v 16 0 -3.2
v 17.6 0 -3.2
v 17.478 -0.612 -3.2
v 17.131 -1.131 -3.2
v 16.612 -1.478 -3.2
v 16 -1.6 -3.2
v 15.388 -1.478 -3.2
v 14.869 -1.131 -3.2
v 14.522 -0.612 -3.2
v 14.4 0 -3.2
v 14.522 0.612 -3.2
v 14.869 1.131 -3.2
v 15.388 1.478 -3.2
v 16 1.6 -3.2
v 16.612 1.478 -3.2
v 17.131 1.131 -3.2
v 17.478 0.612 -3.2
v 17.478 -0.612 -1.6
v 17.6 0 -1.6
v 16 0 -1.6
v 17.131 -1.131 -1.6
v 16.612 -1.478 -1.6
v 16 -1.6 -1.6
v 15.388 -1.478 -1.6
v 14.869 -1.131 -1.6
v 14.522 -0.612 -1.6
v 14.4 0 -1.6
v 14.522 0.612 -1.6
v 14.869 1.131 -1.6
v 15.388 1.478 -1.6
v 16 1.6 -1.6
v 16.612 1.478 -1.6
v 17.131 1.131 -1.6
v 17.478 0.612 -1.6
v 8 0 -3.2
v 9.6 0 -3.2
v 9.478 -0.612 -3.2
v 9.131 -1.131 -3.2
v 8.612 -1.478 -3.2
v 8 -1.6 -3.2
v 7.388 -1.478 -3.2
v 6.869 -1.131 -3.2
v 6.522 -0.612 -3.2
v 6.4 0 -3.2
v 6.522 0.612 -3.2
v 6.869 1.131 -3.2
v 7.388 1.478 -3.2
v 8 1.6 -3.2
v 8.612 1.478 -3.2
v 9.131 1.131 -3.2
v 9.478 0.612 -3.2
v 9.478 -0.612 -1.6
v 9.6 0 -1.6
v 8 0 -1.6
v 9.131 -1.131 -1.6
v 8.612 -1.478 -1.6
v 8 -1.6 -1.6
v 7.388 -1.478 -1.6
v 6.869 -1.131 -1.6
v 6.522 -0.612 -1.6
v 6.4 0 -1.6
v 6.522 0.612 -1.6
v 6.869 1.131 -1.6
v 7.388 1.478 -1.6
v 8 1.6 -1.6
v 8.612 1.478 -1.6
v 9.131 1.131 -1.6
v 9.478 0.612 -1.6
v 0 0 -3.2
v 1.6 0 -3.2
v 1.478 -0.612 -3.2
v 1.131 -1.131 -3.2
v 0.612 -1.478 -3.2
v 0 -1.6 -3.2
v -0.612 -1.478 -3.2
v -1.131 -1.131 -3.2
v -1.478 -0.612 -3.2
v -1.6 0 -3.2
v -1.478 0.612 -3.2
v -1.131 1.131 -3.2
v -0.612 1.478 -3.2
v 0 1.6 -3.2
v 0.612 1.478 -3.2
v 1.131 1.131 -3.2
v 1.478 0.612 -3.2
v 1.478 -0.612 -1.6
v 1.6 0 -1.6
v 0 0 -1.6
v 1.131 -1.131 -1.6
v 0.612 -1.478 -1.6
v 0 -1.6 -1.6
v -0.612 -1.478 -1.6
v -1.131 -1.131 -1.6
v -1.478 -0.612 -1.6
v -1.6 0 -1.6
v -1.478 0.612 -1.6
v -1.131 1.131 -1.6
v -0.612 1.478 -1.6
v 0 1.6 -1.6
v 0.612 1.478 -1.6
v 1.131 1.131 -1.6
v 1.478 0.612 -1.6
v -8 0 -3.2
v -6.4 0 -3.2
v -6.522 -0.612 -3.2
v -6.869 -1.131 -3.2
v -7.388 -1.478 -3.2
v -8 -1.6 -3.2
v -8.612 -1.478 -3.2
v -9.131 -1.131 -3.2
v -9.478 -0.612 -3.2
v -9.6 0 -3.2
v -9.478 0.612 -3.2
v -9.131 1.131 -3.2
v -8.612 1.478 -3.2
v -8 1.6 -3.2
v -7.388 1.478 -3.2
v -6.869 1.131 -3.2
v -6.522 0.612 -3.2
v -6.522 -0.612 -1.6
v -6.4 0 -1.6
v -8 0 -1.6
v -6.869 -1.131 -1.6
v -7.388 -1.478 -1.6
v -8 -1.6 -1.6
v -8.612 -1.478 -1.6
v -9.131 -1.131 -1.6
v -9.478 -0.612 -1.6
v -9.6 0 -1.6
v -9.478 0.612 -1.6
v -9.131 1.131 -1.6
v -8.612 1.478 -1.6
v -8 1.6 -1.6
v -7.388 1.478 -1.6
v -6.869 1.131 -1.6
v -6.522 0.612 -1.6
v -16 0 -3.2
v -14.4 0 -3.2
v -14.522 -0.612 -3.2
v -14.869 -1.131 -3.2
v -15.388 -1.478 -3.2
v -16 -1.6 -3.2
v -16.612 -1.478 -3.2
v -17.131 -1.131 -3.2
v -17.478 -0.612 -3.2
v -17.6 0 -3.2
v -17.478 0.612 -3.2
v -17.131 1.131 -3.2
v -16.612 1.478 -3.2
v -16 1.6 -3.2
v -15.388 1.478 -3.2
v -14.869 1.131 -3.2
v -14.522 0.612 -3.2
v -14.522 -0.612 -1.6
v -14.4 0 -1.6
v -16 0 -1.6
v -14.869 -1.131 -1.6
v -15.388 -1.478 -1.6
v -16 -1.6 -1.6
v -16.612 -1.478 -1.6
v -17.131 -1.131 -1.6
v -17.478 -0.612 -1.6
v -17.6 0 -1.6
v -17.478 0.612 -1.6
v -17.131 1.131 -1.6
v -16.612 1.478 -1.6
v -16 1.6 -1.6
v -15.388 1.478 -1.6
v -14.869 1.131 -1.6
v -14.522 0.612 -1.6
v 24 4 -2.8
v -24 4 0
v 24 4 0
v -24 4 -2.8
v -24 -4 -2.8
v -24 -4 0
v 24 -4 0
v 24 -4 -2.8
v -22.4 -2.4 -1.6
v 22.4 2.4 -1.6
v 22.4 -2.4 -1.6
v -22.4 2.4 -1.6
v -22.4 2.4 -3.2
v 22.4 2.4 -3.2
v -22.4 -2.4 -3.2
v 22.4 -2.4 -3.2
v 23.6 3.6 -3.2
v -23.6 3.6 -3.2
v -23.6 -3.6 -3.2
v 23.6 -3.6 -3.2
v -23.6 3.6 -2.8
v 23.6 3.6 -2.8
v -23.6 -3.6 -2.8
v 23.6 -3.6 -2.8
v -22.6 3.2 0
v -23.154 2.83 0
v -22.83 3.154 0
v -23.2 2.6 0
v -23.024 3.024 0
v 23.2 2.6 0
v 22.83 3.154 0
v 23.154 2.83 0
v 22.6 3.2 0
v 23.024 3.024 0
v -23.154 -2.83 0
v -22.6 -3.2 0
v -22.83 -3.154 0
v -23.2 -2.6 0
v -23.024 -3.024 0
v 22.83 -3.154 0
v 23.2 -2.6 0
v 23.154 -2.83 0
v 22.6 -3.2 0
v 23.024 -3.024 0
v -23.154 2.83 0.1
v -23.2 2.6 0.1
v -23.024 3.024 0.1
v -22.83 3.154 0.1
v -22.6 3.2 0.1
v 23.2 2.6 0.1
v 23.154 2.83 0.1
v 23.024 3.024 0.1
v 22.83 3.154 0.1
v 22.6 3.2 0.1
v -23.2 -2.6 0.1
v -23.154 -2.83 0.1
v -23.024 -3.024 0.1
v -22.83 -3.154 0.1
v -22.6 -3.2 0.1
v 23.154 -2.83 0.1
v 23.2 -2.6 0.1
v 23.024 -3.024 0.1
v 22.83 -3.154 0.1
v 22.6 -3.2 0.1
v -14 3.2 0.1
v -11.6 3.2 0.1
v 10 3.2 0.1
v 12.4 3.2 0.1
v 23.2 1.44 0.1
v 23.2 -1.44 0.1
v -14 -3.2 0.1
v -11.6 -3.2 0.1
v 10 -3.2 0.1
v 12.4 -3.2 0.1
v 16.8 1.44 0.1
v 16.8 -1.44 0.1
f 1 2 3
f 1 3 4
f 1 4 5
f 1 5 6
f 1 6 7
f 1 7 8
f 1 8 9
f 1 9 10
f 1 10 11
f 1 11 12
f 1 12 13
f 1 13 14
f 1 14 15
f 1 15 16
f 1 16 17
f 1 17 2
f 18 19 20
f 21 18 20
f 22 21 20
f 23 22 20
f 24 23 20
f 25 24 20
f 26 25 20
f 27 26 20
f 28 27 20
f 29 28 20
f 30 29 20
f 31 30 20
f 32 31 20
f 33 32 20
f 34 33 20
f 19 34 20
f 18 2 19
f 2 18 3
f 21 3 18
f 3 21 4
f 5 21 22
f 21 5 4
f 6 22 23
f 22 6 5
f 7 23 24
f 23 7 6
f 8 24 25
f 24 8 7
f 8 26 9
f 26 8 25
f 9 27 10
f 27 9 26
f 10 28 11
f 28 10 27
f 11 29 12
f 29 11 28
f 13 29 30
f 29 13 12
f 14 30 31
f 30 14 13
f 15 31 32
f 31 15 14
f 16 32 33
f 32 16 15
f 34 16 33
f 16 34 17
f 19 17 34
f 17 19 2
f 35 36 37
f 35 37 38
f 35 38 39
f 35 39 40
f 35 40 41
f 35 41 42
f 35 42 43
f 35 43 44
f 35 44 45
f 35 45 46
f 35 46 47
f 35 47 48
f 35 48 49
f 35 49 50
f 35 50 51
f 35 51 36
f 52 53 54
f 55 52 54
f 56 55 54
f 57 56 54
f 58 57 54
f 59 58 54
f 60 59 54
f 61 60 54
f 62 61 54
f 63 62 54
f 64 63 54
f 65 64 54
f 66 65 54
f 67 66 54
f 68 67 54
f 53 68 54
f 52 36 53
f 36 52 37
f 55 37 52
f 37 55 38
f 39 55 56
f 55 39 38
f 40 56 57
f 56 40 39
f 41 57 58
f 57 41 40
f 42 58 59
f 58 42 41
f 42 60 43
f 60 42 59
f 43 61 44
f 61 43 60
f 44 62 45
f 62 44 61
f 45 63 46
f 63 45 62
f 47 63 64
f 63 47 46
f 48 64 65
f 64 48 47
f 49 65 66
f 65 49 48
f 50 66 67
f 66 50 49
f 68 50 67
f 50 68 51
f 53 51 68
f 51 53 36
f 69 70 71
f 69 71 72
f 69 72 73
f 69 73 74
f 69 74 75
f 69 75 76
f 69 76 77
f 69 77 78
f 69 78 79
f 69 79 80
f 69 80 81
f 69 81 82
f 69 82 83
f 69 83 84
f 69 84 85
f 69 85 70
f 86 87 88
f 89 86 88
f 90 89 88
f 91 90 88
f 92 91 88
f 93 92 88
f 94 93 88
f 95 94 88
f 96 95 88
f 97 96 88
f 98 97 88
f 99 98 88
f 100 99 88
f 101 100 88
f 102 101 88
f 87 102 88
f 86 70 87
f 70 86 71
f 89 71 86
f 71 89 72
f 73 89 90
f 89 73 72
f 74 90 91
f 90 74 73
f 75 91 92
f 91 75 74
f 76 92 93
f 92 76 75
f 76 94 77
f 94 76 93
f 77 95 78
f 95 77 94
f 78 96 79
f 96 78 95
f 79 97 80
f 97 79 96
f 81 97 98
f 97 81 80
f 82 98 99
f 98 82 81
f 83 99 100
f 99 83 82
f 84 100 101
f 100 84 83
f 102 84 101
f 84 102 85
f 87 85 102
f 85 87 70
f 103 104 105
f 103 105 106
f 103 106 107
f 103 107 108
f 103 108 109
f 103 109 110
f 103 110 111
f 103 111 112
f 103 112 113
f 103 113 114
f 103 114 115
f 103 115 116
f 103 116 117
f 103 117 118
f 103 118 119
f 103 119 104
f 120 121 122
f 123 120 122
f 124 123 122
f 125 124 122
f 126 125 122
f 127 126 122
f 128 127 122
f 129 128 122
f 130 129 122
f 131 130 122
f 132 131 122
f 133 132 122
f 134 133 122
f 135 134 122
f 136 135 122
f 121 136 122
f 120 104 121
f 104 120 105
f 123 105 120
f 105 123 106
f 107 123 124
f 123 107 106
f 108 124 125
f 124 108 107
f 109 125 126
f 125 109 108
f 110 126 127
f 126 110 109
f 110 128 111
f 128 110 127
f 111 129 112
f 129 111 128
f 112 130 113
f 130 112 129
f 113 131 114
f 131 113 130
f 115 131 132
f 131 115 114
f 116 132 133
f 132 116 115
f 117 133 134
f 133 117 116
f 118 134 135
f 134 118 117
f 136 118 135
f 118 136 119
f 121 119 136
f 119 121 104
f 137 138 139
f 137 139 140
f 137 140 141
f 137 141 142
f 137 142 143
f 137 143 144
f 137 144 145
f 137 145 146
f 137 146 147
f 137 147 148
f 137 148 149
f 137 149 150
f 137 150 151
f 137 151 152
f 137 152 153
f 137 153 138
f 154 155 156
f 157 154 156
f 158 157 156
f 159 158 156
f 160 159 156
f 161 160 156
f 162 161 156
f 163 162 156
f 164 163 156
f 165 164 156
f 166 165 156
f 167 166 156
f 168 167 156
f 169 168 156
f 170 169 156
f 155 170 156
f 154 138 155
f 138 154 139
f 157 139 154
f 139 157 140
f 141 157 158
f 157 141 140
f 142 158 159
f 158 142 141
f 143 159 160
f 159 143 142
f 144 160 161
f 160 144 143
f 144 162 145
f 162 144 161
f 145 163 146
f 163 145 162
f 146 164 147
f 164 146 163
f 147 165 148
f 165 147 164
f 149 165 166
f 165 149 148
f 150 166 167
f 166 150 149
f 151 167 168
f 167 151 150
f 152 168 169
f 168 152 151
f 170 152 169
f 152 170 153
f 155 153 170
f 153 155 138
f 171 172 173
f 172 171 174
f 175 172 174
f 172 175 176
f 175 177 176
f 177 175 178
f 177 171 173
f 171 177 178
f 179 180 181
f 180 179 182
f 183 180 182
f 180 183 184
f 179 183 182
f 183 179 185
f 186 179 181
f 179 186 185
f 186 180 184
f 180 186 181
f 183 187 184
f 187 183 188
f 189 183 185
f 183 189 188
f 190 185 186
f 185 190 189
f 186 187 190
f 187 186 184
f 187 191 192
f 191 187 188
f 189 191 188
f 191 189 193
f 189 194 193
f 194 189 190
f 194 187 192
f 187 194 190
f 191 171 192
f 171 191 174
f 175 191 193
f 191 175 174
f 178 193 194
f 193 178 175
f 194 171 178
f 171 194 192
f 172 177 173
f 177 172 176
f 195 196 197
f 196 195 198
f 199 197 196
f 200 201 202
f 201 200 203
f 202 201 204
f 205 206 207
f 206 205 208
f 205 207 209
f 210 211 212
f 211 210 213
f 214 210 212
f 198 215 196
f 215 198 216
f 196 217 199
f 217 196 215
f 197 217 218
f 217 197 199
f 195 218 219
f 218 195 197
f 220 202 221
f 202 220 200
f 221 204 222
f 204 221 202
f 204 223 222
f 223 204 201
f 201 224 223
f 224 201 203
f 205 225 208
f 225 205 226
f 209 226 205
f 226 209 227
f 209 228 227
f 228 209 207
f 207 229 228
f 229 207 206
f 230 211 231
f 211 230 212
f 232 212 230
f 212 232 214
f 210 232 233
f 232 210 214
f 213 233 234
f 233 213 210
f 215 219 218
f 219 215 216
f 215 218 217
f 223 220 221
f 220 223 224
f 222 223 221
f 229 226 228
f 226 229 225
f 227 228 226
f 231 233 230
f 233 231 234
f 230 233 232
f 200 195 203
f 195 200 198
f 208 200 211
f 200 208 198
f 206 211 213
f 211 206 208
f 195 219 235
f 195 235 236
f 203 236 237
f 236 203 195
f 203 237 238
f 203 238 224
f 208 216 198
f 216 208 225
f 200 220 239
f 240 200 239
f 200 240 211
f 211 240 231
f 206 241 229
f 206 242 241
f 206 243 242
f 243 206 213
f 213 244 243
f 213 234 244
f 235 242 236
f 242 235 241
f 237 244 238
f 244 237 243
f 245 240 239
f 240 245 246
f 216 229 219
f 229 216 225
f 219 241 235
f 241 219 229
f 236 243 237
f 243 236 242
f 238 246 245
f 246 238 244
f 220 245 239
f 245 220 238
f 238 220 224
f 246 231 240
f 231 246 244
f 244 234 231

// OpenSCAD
// file: ../p/4-4edge.scad
use <../lib.scad>
function ldraw_lib__4_4edge() = [
// 0 Circle 1.0
// 0 Name: 4-4edge.dat
// 0 Author: James Jessiman
// 0 !LDRAW_ORG Primitive UPDATE 2017-01
// 0 !LICENSE Licensed under CC BY 2.0 and CC BY 4.0 : see CAreadme.txt
// 
// 0 BFC CERTIFY CCW
  [0,"BFC","CERTIFY"],
  [0,"BFC","CCW"],
// 
// 0 !HISTORY 1998-12-15 [PTadmin] Official Update 1998-10
// 0 !HISTORY 2005-12-28 [PTadmin] Official Update 2005-01
// 0 !HISTORY 2007-06-24 [PTadmin] Header formatted for Contributor Agreement
// 0 !HISTORY 2008-07-01 [PTadmin] Official Update 2008-01
// 0 !HISTORY 2017-01-15 [Steffen] BFCed
// 0 !HISTORY 2017-12-30 [PTadmin] Official Update 2017-01
// 
// 
// 2 24 1 0 0 0.9239 0 0.3827
  [2,24,1,0,0,0.9239,0,0.3827],
// 2 24 0.9239 0 0.3827 0.7071 0 0.7071
  [2,24,0.9239,0,0.3827,0.7071,0,0.7071],
// 2 24 0.7071 0 0.7071 0.3827 0 0.9239
  [2,24,0.7071,0,0.7071,0.3827,0,0.9239],
// 2 24 0.3827 0 0.9239 0 0 1
  [2,24,0.3827,0,0.9239,0,0,1],
// 2 24 0 0 1 -0.3827 0 0.9239
  [2,24,0,0,1,-0.3827,0,0.9239],
// 2 24 -0.3827 0 0.9239 -0.7071 0 0.7071
  [2,24,-0.3827,0,0.9239,-0.7071,0,0.7071],
// 2 24 -0.7071 0 0.7071 -0.9239 0 0.3827
  [2,24,-0.7071,0,0.7071,-0.9239,0,0.3827],
// 2 24 -0.9239 0 0.3827 -1 0 -0
  [2,24,-0.9239,0,0.3827,-1,0,-0],
// 2 24 -1 0 -0 -0.9239 0 -0.3827
  [2,24,-1,0,-0,-0.9239,0,-0.3827],
// 2 24 -0.9239 0 -0.3827 -0.7071 0 -0.7071
  [2,24,-0.9239,0,-0.3827,-0.7071,0,-0.7071],
// 2 24 -0.7071 0 -0.7071 -0.3827 0 -0.9239
  [2,24,-0.7071,0,-0.7071,-0.3827,0,-0.9239],
// 2 24 -0.3827 0 -0.9239 0 0 -1
  [2,24,-0.3827,0,-0.9239,0,0,-1],
// 2 24 0 0 -1 0.3827 0 -0.9239
  [2,24,0,0,-1,0.3827,0,-0.9239],
// 2 24 0.3827 0 -0.9239 0.7071 0 -0.7071
  [2,24,0.3827,0,-0.9239,0.7071,0,-0.7071],
// 2 24 0.7071 0 -0.7071 0.9239 0 -0.3827
  [2,24,0.7071,0,-0.7071,0.9239,0,-0.3827],
// 2 24 0.9239 0 -0.3827 1 0 0
  [2,24,0.9239,0,-0.3827,1,0,0],
];
module ldraw_lib__4_4edge(step=0, col=false, unit=2/5, alt=false, line=0.2, solid=!$preview)
    makepoly(ldraw_lib__4_4edge(), step=step, col=col, unit=unit, alt=alt, line=line, solid=solid);
ldraw_lib__4_4edge(line=0.2);
// file: ../p/4-4disc.scad
use <../lib.scad>
function ldraw_lib__4_4disc() = [
// 0 Disc 1.0
// 0 Name: 4-4disc.dat
// 0 Author: James Jessiman
// 0 !LDRAW_ORG Primitive UPDATE 2002-02
// 0 !LICENSE Licensed under CC BY 2.0 and CC BY 4.0 : see CAreadme.txt
// 
// 0 BFC CERTIFY CCW
  [0,"BFC","CERTIFY"],
  [0,"BFC","CCW"],
// 
// 0 !HISTORY 1998-12-15 [PTadmin] Official Update 1998-10
// 0 !HISTORY 2002-03-23 [sbliss] Added BFC statement
// 0 !HISTORY 2002-04-25 [PTadmin] Official Update 2002-02
// 0 !HISTORY 2007-06-24 [PTadmin] Header formatted for Contributor Agreement
// 0 !HISTORY 2008-07-01 [PTadmin] Official Update 2008-01
// 
// 
// 3 16 0 0 0 1 0 0 0.9239 0 0.3827
  [3,16,0,0,0,1,0,0,0.9239,0,0.3827],
// 3 16 0 0 0 0.9239 0 0.3827 0.7071 0 0.7071
  [3,16,0,0,0,0.9239,0,0.3827,0.7071,0,0.7071],
// 3 16 0 0 0 0.7071 0 0.7071 0.3827 0 0.9239
  [3,16,0,0,0,0.7071,0,0.7071,0.3827,0,0.9239],
// 3 16 0 0 0 0.3827 0 0.9239 0 0 1
  [3,16,0,0,0,0.3827,0,0.9239,0,0,1],
// 3 16 0 0 0 0 0 1 -0.3827 0 0.9239
  [3,16,0,0,0,0,0,1,-0.3827,0,0.9239],
// 3 16 0 0 0 -0.3827 0 0.9239 -0.7071 0 0.7071
  [3,16,0,0,0,-0.3827,0,0.9239,-0.7071,0,0.7071],
// 3 16 0 0 0 -0.7071 0 0.7071 -0.9239 0 0.3827
  [3,16,0,0,0,-0.7071,0,0.7071,-0.9239,0,0.3827],
// 3 16 0 0 0 -0.9239 0 0.3827 -1 0 -0
  [3,16,0,0,0,-0.9239,0,0.3827,-1,0,-0],
// 3 16 0 0 0 -1 0 -0 -0.9239 0 -0.3827
  [3,16,0,0,0,-1,0,-0,-0.9239,0,-0.3827],
// 3 16 0 0 0 -0.9239 0 -0.3827 -0.7071 0 -0.7071
  [3,16,0,0,0,-0.9239,0,-0.3827,-0.7071,0,-0.7071],
// 3 16 0 0 0 -0.7071 0 -0.7071 -0.3827 0 -0.9239
  [3,16,0,0,0,-0.7071,0,-0.7071,-0.3827,0,-0.9239],
// 3 16 0 0 0 -0.3827 0 -0.9239 0 0 -1
  [3,16,0,0,0,-0.3827,0,-0.9239,0,0,-1],
// 3 16 0 0 0 0 0 -1 0.3827 0 -0.9239
  [3,16,0,0,0,0,0,-1,0.3827,0,-0.9239],
// 3 16 0 0 0 0.3827 0 -0.9239 0.7071 0 -0.7071
  [3,16,0,0,0,0.3827,0,-0.9239,0.7071,0,-0.7071],
// 3 16 0 0 0 0.7071 0 -0.7071 0.9239 0 -0.3827
  [3,16,0,0,0,0.7071,0,-0.7071,0.9239,0,-0.3827],
// 3 16 0 0 0 0.9239 0 -0.3827 1 0 0
  [3,16,0,0,0,0.9239,0,-0.3827,1,0,0],
// 0
];
module ldraw_lib__4_4disc(step=0, col=false, unit=2/5, alt=false, line=0.2, solid=!$preview)
    makepoly(ldraw_lib__4_4disc(), step=step, col=col, unit=unit, alt=alt, line=line, solid=solid);
ldraw_lib__4_4disc(line=0.2);
// file: ../p/4-4cyli.scad
use <../lib.scad>
$fa=1; $fs=0.2;
function ldraw_lib__4_4cyli(realsolid=false) = [
// 0 Cylinder 1.0
// 0 Name: 4-4cyli.dat
// 0 Author: James Jessiman
// 0 !LDRAW_ORG Primitive UPDATE 2005-01
// 0 !LICENSE Licensed under CC BY 2.0 and CC BY 4.0 : see CAreadme.txt
// 
// 0 BFC CERTIFY CCW
  [0,"BFC","CERTIFY"],
  [0,"BFC","CCW"],
// 
// 0 !HISTORY 1998-12-15 [PTadmin] Official Update 1998-10
// 0 !HISTORY 2002-03-23 [sbliss] Added BFC statement; merged headers from files in distributions LDraw 0.27 and Complete.
// 0 !HISTORY 2002-04-25 [PTadmin] Official Update 2002-02
// 0 !HISTORY 2004-12-14 [guyvivan] BFC CCW
// 0 !HISTORY 2005-12-28 [PTadmin] Official Update 2005-01
// 0 !HISTORY 2007-06-24 [PTadmin] Header formatted for Contributor Agreement
// 0 !HISTORY 2008-07-01 [PTadmin] Official Update 2008-01
// 
// 
// 4 16 1 1 0 0.9239 1 0.3827 0.9239 0 0.3827 1 0 0
  [4,16,1,1,0,0.9239,1,0.3827,0.9239,0,0.3827,1,0,0],
// 5 24 1 0 0 1 1 0 0.9239 0 0.3827 0.9239 0 -0.3827
  [5,24,1,0,0,1,1,0,0.9239,0,0.3827,0.9239,0,-0.3827],
// 4 16 0.9239 1 0.3827 0.7071 1 0.7071 0.7071 0 0.7071 0.9239 0 0.3827
  [4,16,0.9239,1,0.3827,0.7071,1,0.7071,0.7071,0,0.7071,0.9239,0,0.3827],
// 5 24 0.9239 0 0.3827 0.9239 1 0.3827 0.7071 0 0.7071 1 0 0
  [5,24,0.9239,0,0.3827,0.9239,1,0.3827,0.7071,0,0.7071,1,0,0],
// 4 16 0.7071 1 0.7071 0.3827 1 0.9239 0.3827 0 0.9239 0.7071 0 0.7071
  [4,16,0.7071,1,0.7071,0.3827,1,0.9239,0.3827,0,0.9239,0.7071,0,0.7071],
// 5 24 0.7071 0 0.7071 0.7071 1 0.7071 0.3827 0 0.9239 0.9239 0 0.3827
  [5,24,0.7071,0,0.7071,0.7071,1,0.7071,0.3827,0,0.9239,0.9239,0,0.3827],
// 4 16 0.3827 1 0.9239 0 1 1 0 0 1 0.3827 0 0.9239
  [4,16,0.3827,1,0.9239,0,1,1,0,0,1,0.3827,0,0.9239],
// 5 24 0.3827 0 0.9239 0.3827 1 0.9239 0 0 1 0.7071 0 0.7071
  [5,24,0.3827,0,0.9239,0.3827,1,0.9239,0,0,1,0.7071,0,0.7071],
// 4 16 0 1 1 -0.3827 1 0.9239 -0.3827 0 0.9239 0 0 1
  [4,16,0,1,1,-0.3827,1,0.9239,-0.3827,0,0.9239,0,0,1],
// 5 24 0 0 1 0 1 1 -0.3827 0 0.9239 0.3827 0 0.9239
  [5,24,0,0,1,0,1,1,-0.3827,0,0.9239,0.3827,0,0.9239],
// 4 16 -0.3827 1 0.9239 -0.7071 1 0.7071 -0.7071 0 0.7071 -0.3827 0 0.9239
  [4,16,-0.3827,1,0.9239,-0.7071,1,0.7071,-0.7071,0,0.7071,-0.3827,0,0.9239],
// 5 24 -0.3827 0 0.9239 -0.3827 1 0.9239 -0.7071 0 0.7071 0 0 1
  [5,24,-0.3827,0,0.9239,-0.3827,1,0.9239,-0.7071,0,0.7071,0,0,1],
// 4 16 -0.7071 1 0.7071 -0.9239 1 0.3827 -0.9239 0 0.3827 -0.7071 0 0.7071
  [4,16,-0.7071,1,0.7071,-0.9239,1,0.3827,-0.9239,0,0.3827,-0.7071,0,0.7071],
// 5 24 -0.7071 0 0.7071 -0.7071 1 0.7071 -0.9239 0 0.3827 -0.3827 0 0.9239
  [5,24,-0.7071,0,0.7071,-0.7071,1,0.7071,-0.9239,0,0.3827,-0.3827,0,0.9239],
// 4 16 -0.9239 1 0.3827 -1 1 0 -1 0 0 -0.9239 0 0.3827
  [4,16,-0.9239,1,0.3827,-1,1,0,-1,0,0,-0.9239,0,0.3827],
// 5 24 -0.9239 0 0.3827 -0.9239 1 0.3827 -1 0 0 -0.7071 0 0.7071
  [5,24,-0.9239,0,0.3827,-0.9239,1,0.3827,-1,0,0,-0.7071,0,0.7071],
// 4 16 -1 1 0 -0.9239 1 -0.3827 -0.9239 0 -0.3827 -1 0 0
  [4,16,-1,1,0,-0.9239,1,-0.3827,-0.9239,0,-0.3827,-1,0,0],
// 5 24 -1 0 0 -1 1 0 -0.9239 0 -0.3827 -0.9239 0 0.3827
  [5,24,-1,0,0,-1,1,0,-0.9239,0,-0.3827,-0.9239,0,0.3827],
// 4 16 -0.9239 1 -0.3827 -0.7071 1 -0.7071 -0.7071 0 -0.7071 -0.9239 0 -0.3827
  [4,16,-0.9239,1,-0.3827,-0.7071,1,-0.7071,-0.7071,0,-0.7071,-0.9239,0,-0.3827],
// 5 24 -0.9239 0 -0.3827 -0.9239 1 -0.3827 -0.7071 0 -0.7071 -1 0 0
  [5,24,-0.9239,0,-0.3827,-0.9239,1,-0.3827,-0.7071,0,-0.7071,-1,0,0],
// 4 16 -0.7071 1 -0.7071 -0.3827 1 -0.9239 -0.3827 0 -0.9239 -0.7071 0 -0.7071
  [4,16,-0.7071,1,-0.7071,-0.3827,1,-0.9239,-0.3827,0,-0.9239,-0.7071,0,-0.7071],
// 5 24 -0.7071 0 -0.7071 -0.7071 1 -0.7071 -0.3827 0 -0.9239 -0.9239 0 -0.3827
  [5,24,-0.7071,0,-0.7071,-0.7071,1,-0.7071,-0.3827,0,-0.9239,-0.9239,0,-0.3827],
// 4 16 -0.3827 1 -0.9239 0 1 -1 0 0 -1 -0.3827 0 -0.9239
  [4,16,-0.3827,1,-0.9239,0,1,-1,0,0,-1,-0.3827,0,-0.9239],
// 5 24 -0.3827 0 -0.9239 -0.3827 1 -0.9239 0 0 -1 -0.7071 0 -0.7071
  [5,24,-0.3827,0,-0.9239,-0.3827,1,-0.9239,0,0,-1,-0.7071,0,-0.7071],
// 4 16 0 1 -1 0.3827 1 -0.9239 0.3827 0 -0.9239 0 0 -1
  [4,16,0,1,-1,0.3827,1,-0.9239,0.3827,0,-0.9239,0,0,-1],
// 5 24 0 0 -1 0 1 -1 0.3827 0 -0.9239 -0.3827 0 -0.9239
  [5,24,0,0,-1,0,1,-1,0.3827,0,-0.9239,-0.3827,0,-0.9239],
// 4 16 0.3827 1 -0.9239 0.7071 1 -0.7071 0.7071 0 -0.7071 0.3827 0 -0.9239
  [4,16,0.3827,1,-0.9239,0.7071,1,-0.7071,0.7071,0,-0.7071,0.3827,0,-0.9239],
// 5 24 0.3827 0 -0.9239 0.3827 1 -0.9239 0.7071 0 -0.7071 0 0 -1
  [5,24,0.3827,0,-0.9239,0.3827,1,-0.9239,0.7071,0,-0.7071,0,0,-1],
// 4 16 0.7071 1 -0.7071 0.9239 1 -0.3827 0.9239 0 -0.3827 0.7071 0 -0.7071
  [4,16,0.7071,1,-0.7071,0.9239,1,-0.3827,0.9239,0,-0.3827,0.7071,0,-0.7071],
// 5 24 0.7071 0 -0.7071 0.7071 1 -0.7071 0.9239 0 -0.3827 0.3827 0 -0.9239
  [5,24,0.7071,0,-0.7071,0.7071,1,-0.7071,0.9239,0,-0.3827,0.3827,0,-0.9239],
// 4 16 0.9239 1 -0.3827 1 1 0 1 0 0 0.9239 0 -0.3827
  [4,16,0.9239,1,-0.3827,1,1,0,1,0,0,0.9239,0,-0.3827],
// 5 24 0.9239 0 -0.3827 0.9239 1 -0.3827 1 0 0 0.7071 0 -0.7071
  [5,24,0.9239,0,-0.3827,0.9239,1,-0.3827,1,0,0,0.7071,0,-0.7071],
// 0
];
module ldraw_lib__4_4cyli(step=0, col=false, unit=2/5, alt=false, line=0.2, solid=!$preview)
    makepoly(ldraw_lib__4_4cyli(solid), step=step, col=col, unit=unit, alt=alt, line=line, solid=solid);
ldraw_lib__4_4cyli(line=0.2);
// file: ../p/stud3.scad
use <../lib.scad>
use <4-4cyli.scad>
use <4-4disc.scad>
use <4-4edge.scad>
function ldraw_lib__stud3() = [
// 0 Stud Tube Solid
// 0 Name: stud3.dat
// 0 Author: James Jessiman
// 0 !LDRAW_ORG Primitive UPDATE 2012-01
// 0 !LICENSE Licensed under CC BY 4.0 : see CAreadme.txt
// 
// 0 BFC CERTIFY CCW
  [0,"BFC","CERTIFY"],
  [0,"BFC","CCW"],
// 
// 0 !HISTORY 2002-04-04 [sbliss] Modified for BFC compliance
// 0 !HISTORY 2002-04-25 [PTadmin] Official Update 2002-02
// 0 !HISTORY 2007-06-24 [PTadmin] Header formatted for Contributor Agreement
// 0 !HISTORY 2008-07-01 [PTadmin] Official Update 2008-01
// 0 !HISTORY 2012-02-16 [Philo] Changed to CCW
// 0 !HISTORY 2012-03-30 [PTadmin] Official Update 2012-01
// 
// 
// 1 16 0 -4 0 4 0 0 0 1 0 0 0 4 4-4edge.dat
  [1,16,0,-4,0,4,0,0,0,1,0,0,0,4, ldraw_lib__4_4edge()],
// 1 16 0 0 0 4 0 0 0 1 0 0 0 4 4-4edge.dat
  [1,16,0,0,0,4,0,0,0,1,0,0,0,4, ldraw_lib__4_4edge()],
// 1 16 0 -4 0 4 0 0 0 1 0 0 0 4 4-4disc.dat
  [1,16,0,-4,0,4,0,0,0,1,0,0,0,4, ldraw_lib__4_4disc()],
  [-1,16,0,0,0,4,0,0,0,-1,0,0,0,4, ldraw_lib__4_4disc()],
// 1 16 0 -4 0 4 0 0 0 4 0 0 0 4 4-4cyli.dat
  [1,16,0,-4,0,4,0,0,0,4,0,0,0,4, ldraw_lib__4_4cyli()],
];
module ldraw_lib__stud3(step=0, col=false, unit=2/5, alt=false, line=0.2, solid=!$preview)
    makepoly(ldraw_lib__stud3(), step=step, col=col, unit=unit, alt=alt, line=line, solid=solid);
ldraw_lib__stud3(line=0.2);
// file: ../p/box5.scad
use <../lib.scad>
function ldraw_lib__box5() = [
// 0 Box with 5 Faces and All Edges
// 0 Name: box5.dat
// 0 Author: James Jessiman
// 0 !LDRAW_ORG Primitive UPDATE 2012-01
// 0 !LICENSE Licensed under CC BY 2.0 and CC BY 4.0 : see CAreadme.txt
// 
// 0 BFC CERTIFY CCW
  [0,"BFC","CERTIFY"],
  [0,"BFC","CCW"],
// 
// 0 !HISTORY 2002-04-03 [sbliss] Modified for BFC compliance
// 0 !HISTORY 2002-04-25 [PTadmin] Official Update 2002-02
// 0 !HISTORY 2007-06-24 [PTadmin] Header formatted for Contributor Agreement
// 0 !HISTORY 2008-07-01 [PTadmin] Official Update 2008-01
// 0 !HISTORY 2012-02-16 [Philo] Changed to CCW
// 0 !HISTORY 2012-03-30 [PTadmin] Official Update 2012-01
// 
// 
// 2 24 1 1 1 -1 1 1
  [2,24,1,1,1,-1,1,1],
// 2 24 -1 1 1 -1 1 -1
  [2,24,-1,1,1,-1,1,-1],
// 2 24 -1 1 -1 1 1 -1
  [2,24,-1,1,-1,1,1,-1],
// 2 24 1 1 -1 1 1 1
  [2,24,1,1,-1,1,1,1],
// 2 24 1 0 1 -1 0 1
  [2,24,1,0,1,-1,0,1],
// 2 24 -1 0 1 -1 0 -1
  [2,24,-1,0,1,-1,0,-1],
// 2 24 -1 0 -1 1 0 -1
  [2,24,-1,0,-1,1,0,-1],
// 2 24 1 0 -1 1 0 1
  [2,24,1,0,-1,1,0,1],
// 2 24 1 0 1 1 1 1
  [2,24,1,0,1,1,1,1],
// 2 24 -1 0 1 -1 1 1
  [2,24,-1,0,1,-1,1,1],
// 2 24 1 0 -1 1 1 -1
  [2,24,1,0,-1,1,1,-1],
// 2 24 -1 0 -1 -1 1 -1
  [2,24,-1,0,-1,-1,1,-1],
// 4 16 -1 1 1 1 1 1 1 1 -1 -1 1 -1
  [4,16,-1,1,1,1,1,1,1,1,-1,-1,1,-1],
// 4 16 -1 1 1 -1 0 1 1 0 1 1 1 1
  [4,16,-1,1,1,-1,0,1,1,0,1,1,1,1],
// 4 16 -1 1 -1 -1 0 -1 -1 0 1 -1 1 1
  [4,16,-1,1,-1,-1,0,-1,-1,0,1,-1,1,1],
// 4 16 1 1 -1 1 0 -1 -1 0 -1 -1 1 -1
  [4,16,1,1,-1,1,0,-1,-1,0,-1,-1,1,-1],
// 4 16 1 1 1 1 0 1 1 0 -1 1 1 -1
  [4,16,1,1,1,1,0,1,1,0,-1,1,1,-1],
];
makepoly(ldraw_lib__box5(), line=0.2);
// file: ../p/box4.scad
use <../lib.scad>
function ldraw_lib__box4() = [
// 0 Box with 4 Faces (2 Parallel Pairs) and All Edges
// 0 Name: box4.dat
// 0 Author: James Jessiman
// 0 !LDRAW_ORG Primitive UPDATE 2012-01
// 0 !LICENSE Licensed under CC BY 4.0 : see CAreadme.txt
// 
// 0 BFC CERTIFY CCW
  [0,"BFC","CERTIFY"],
  [0,"BFC","CCW"],
// 
// 0 !HISTORY 2002-04-03 [sbliss] Modified for BFC compliance
// 0 !HISTORY 2002-04-25 [PTadmin] Official Update 2002-02
// 0 !HISTORY 2007-06-24 [PTadmin] Header formatted for Contributor Agreement
// 0 !HISTORY 2008-07-01 [PTadmin] Official Update 2008-01
// 0 !HISTORY 2012-02-16 [Philo] Changed to CCW
// 0 !HISTORY 2012-03-30 [PTadmin] Official Update 2012-01
// 
// 
// 2 24 1 1 1 -1 1 1
  [2,24,1,1,1,-1,1,1],
// 2 24 -1 1 1 -1 1 -1
  [2,24,-1,1,1,-1,1,-1],
// 2 24 -1 1 -1 1 1 -1
  [2,24,-1,1,-1,1,1,-1],
// 2 24 1 1 -1 1 1 1
  [2,24,1,1,-1,1,1,1],
// 2 24 1 0 1 -1 0 1
  [2,24,1,0,1,-1,0,1],
// 2 24 -1 0 1 -1 0 -1
  [2,24,-1,0,1,-1,0,-1],
// 2 24 -1 0 -1 1 0 -1
  [2,24,-1,0,-1,1,0,-1],
// 2 24 1 0 -1 1 0 1
  [2,24,1,0,-1,1,0,1],
// 2 24 1 0 1 1 1 1
  [2,24,1,0,1,1,1,1],
// 2 24 -1 0 1 -1 1 1
  [2,24,-1,0,1,-1,1,1],
// 2 24 1 0 -1 1 1 -1
  [2,24,1,0,-1,1,1,-1],
// 2 24 -1 0 -1 -1 1 -1
  [2,24,-1,0,-1,-1,1,-1],
// 4 16 -1 1 1 -1 0 1 1 0 1 1 1 1
  [4,16,-1,1,1,-1,0,1,1,0,1,1,1,1],
// 4 16 -1 1 -1 -1 0 -1 -1 0 1 -1 1 1
  [4,16,-1,1,-1,-1,0,-1,-1,0,1,-1,1,1],
// 4 16 1 1 -1 1 0 -1 -1 0 -1 -1 1 -1
  [4,16,1,1,-1,1,0,-1,-1,0,-1,-1,1,-1],
// 4 16 1 1 1 1 0 1 1 0 -1 1 1 -1
  [4,16,1,1,1,1,0,1,1,0,-1,1,1,-1],
];
module ldraw_lib__box4(step=0, col=false, unit=2/5, alt=false, line=0.2, solid=!$preview)
    makepoly(ldraw_lib__box4(), step=step, col=col, unit=unit, alt=alt, line=line, solid=solid);
ldraw_lib__box4(line=0.2);
// file: s/6636s01.scad
use <../../lib.scad>
use <../../p/box4.scad>
use <../../p/box5.scad>
use <../../p/stud3.scad>
function ldraw_lib__s__6636s01() = [
// 0 ~Tile  1 x  6 without Top Face
// 0 Name: s\6636s01.dat
// 0 Author: C.L.Rasmussen [johnny-thunder]
// 0 !LDRAW_ORG Subpart UPDATE 2009-03
// 0 !LICENSE Licensed under CC BY 2.0 and CC BY 4.0 : see CAreadme.txt
// 
// 0 BFC CERTIFY CCW
  [0,"BFC","CERTIFY"],
  [0,"BFC","CCW"],
// 
// 0 !HISTORY 2009-12-29 [PTadmin] Official Update 2009-03
// 
// 
// 1 16 40 4 0 1 0 0 0 -1 0 0 0 -1 stud3.dat
  [1,16,40,4,0,1,0,0,0,-1,0,0,0,-1, ldraw_lib__stud3()],
// 1 16 20 4 0 1 0 0 0 -1 0 0 0 -1 stud3.dat
  [1,16,20,4,0,1,0,0,0,-1,0,0,0,-1, ldraw_lib__stud3()],
// 1 16 0 4 0 1 0 0 0 -1 0 0 0 -1 stud3.dat
  [1,16,0,4,0,1,0,0,0,-1,0,0,0,-1, ldraw_lib__stud3()],
// 1 16 -20 4 0 1 0 0 0 -1 0 0 0 -1 stud3.dat
  [1,16,-20,4,0,1,0,0,0,-1,0,0,0,-1, ldraw_lib__stud3()],
// 1 16 -40 4 0 1 0 0 0 -1 0 0 0 -1 stud3.dat
  [1,16,-40,4,0,1,0,0,0,-1,0,0,0,-1, ldraw_lib__stud3()],
// 1 16 0 7 0 60 0 0 0 -7 0 0 0 10 box4.dat
  [1,16,0,7,0,60,0,0,0,-7,0,0,0,10, ldraw_lib__box4()],
// 0 BFC INVERTNEXT
  [0,"BFC","INVERTNEXT"],
// 1 16 0 8 0 56 0 0 0 -4 0 0 0 6 box5.dat
  [1,16,0,8,0,56,0,0,0,-4,0,0,0,6, ldraw_lib__box5()],
// 4 16 59 8 9 56 8 6 -56 8 6 -59 8 9
  [4,16,59,8,9,56,8,6,-56,8,6,-59,8,9],
// 4 16 -59 8 9 -56 8 6 -56 8 -6 -59 8 -9
  [4,16,-59,8,9,-56,8,6,-56,8,-6,-59,8,-9],
// 4 16 -59 8 -9 -56 8 -6 56 8 -6 59 8 -9
  [4,16,-59,8,-9,-56,8,-6,56,8,-6,59,8,-9],
// 4 16 59 8 -9 56 8 -6 56 8 6 59 8 9
  [4,16,59,8,-9,56,8,-6,56,8,6,59,8,9],
// 1 16 0 8 0 59 0 0 0 -1 0 0 0 9 box4.dat
  [1,16,0,8,0,59,0,0,0,-1,0,0,0,9, ldraw_lib__box4()],
// 4 16 60 7 10 59 7 9 -59 7 9 -60 7 10
  [4,16,60,7,10,59,7,9,-59,7,9,-60,7,10],
// 4 16 -60 7 10 -59 7 9 -59 7 -9 -60 7 -10
  [4,16,-60,7,10,-59,7,9,-59,7,-9,-60,7,-10],
// 4 16 -60 7 -10 -59 7 -9 59 7 -9 60 7 -10
  [4,16,-60,7,-10,-59,7,-9,59,7,-9,60,7,-10],
// 4 16 60 7 -10 59 7 -9 59 7 9 60 7 10
  [4,16,60,7,-10,59,7,-9,59,7,9,60,7,10],
// 0
];
makepoly(ldraw_lib__s__6636s01(), line=0.2);
// file: ../p/1-4cyli.scad
use <../lib.scad>
function ldraw_lib__1_4cyli() = [
// 0 Cylinder 0.25
// 0 Name: 1-4cyli.dat
// 0 Author: James Jessiman
// 0 !LDRAW_ORG Primitive UPDATE 2012-01
// 0 !LICENSE Licensed under CC BY 2.0 and CC BY 4.0 : see CAreadme.txt
// 
// 0 BFC CERTIFY CCW
  [0,"BFC","CERTIFY"],
  [0,"BFC","CCW"],
// 
// 0 !HISTORY 2002-03-23 [sbliss] Added BFC statement.
// 0 !HISTORY 2002-04-25 [PTadmin] Official Update 2002-02
// 0 !HISTORY 2007-06-22 [PTadmin] Header formatted for Contributor Agreement
// 0 !HISTORY 2008-07-01 [PTadmin] Official Update 2008-01
// 0 !HISTORY 2012-02-16 [Philo] Changed to CCW
// 0 !HISTORY 2012-03-30 [PTadmin] Official Update 2012-01
// 
// 
// 4 16 1 1 0 0.9239 1 0.3827 0.9239 0 0.3827 1 0 0
  [4,16,1,1,0,0.9239,1,0.3827,0.9239,0,0.3827,1,0,0],
// 5 24 1 0 0 1 1 0 0.9239 0 0.3827 1 0 -1
  [5,24,1,0,0,1,1,0,0.9239,0,0.3827,1,0,-1],
// 4 16 0.9239 1 0.3827 0.7071 1 0.7071 0.7071 0 0.7071 0.9239 0 0.3827
  [4,16,0.9239,1,0.3827,0.7071,1,0.7071,0.7071,0,0.7071,0.9239,0,0.3827],
// 5 24 0.9239 0 0.3827 0.9239 1 0.3827 0.7071 0 0.7071 1 0 0
  [5,24,0.9239,0,0.3827,0.9239,1,0.3827,0.7071,0,0.7071,1,0,0],
// 4 16 0.7071 1 0.7071 0.3827 1 0.9239 0.3827 0 0.9239 0.7071 0 0.7071
  [4,16,0.7071,1,0.7071,0.3827,1,0.9239,0.3827,0,0.9239,0.7071,0,0.7071],
// 5 24 0.7071 0 0.7071 0.7071 1 0.7071 0.3827 0 0.9239 0.9239 0 0.3827
  [5,24,0.7071,0,0.7071,0.7071,1,0.7071,0.3827,0,0.9239,0.9239,0,0.3827],
// 4 16 0.3827 1 0.9239 0 1 1 0 0 1 0.3827 0 0.9239
  [4,16,0.3827,1,0.9239,0,1,1,0,0,1,0.3827,0,0.9239],
// 5 24 0.3827 0 0.9239 0.3827 1 0.9239 0 0 1 0.7071 0 0.7071
  [5,24,0.3827,0,0.9239,0.3827,1,0.9239,0,0,1,0.7071,0,0.7071],
// 5 24 0 0 1 0 1 1 0.3827 0 0.9239 -1 0 1
  [5,24,0,0,1,0,1,1,0.3827,0,0.9239,-1,0,1],
];
module ldraw_lib__1_4cyli(step=0, col=false, unit=2/5, alt=false, line=0.2, solid=!$preview)
    makepoly(ldraw_lib__1_4cyli(), step=step, col=col, unit=unit, alt=alt, line=line, solid=solid);
ldraw_lib__1_4cyli(line=0.2);
// file: ../p/1-4chrd.scad
use <../lib.scad>
$fa=1; $fs=0.2;
function ldraw_lib__1_4chrd(realsolid=false) = [
// 0 Chord 0.25
// 0 Name: 1-4chrd.dat
// 0 Author: Tony Hafner [hafhead]
// 0 !LDRAW_ORG Primitive UPDATE 2012-02
// 0 !LICENSE Licensed under CC BY 2.0 and CC BY 4.0 : see CAreadme.txt
// 
// 0 BFC CERTIFY CCW
  [0,"BFC","CERTIFY"],
  [0,"BFC","CCW"],
// 
// 0 !HISTORY 2004-04-22 [PTadmin] Official Update 2004-02
// 0 !HISTORY 2007-10-09 [PTadmin] Header formatted for Contributor Agreement
// 0 !HISTORY 2008-07-01 [PTadmin] Official Update 2008-01
// 0 !HISTORY 2012-08-02 [MMR1988] Re-creation with PrimGen2 and Rectifier
// 0 !HISTORY 2012-08-09 [PTadmin] Official Update 2012-02
// 
// 
// 4 16 0.9239 0 0.3827 0.3827 0 0.9239 0 0 1 1 0 0
  [4,16,0.9239,0,0.3827,0.3827,0,0.9239,0,0,1,1,0,0],
// 3 16 0.7071 0 0.7071 0.3827 0 0.9239 0.9239 0 0.3827
  [3,16,0.7071,0,0.7071,0.3827,0,0.9239,0.9239,0,0.3827],
];
module ldraw_lib__1_4chrd(step=0, col=false, unit=2/5, alt=false, line=0.2, solid=!$preview)
    makepoly(ldraw_lib__1_4chrd(solid), step=step, col=col, unit=unit, alt=alt, line=line, solid=solid);
ldraw_lib__1_4chrd(line=0.2);
// file: 6636.scad
use <../lib.scad>
use <s/6636s01.scad>
function ldraw_lib__6636() = [
// 0 Tile  1 x  6
// 0 Name: 6636.dat
// 0 Author: James Jessiman
// 0 !LDRAW_ORG Part UPDATE 2009-03
// 0 !LICENSE Licensed under CC BY 2.0 and CC BY 4.0 : see CAreadme.txt
// 
// 0 BFC CERTIFY CCW
  [0,"BFC","CERTIFY"],
  [0,"BFC","CCW"],
// 
// 0 !HISTORY 2002-02-15 [BrickCaster] groove
// 0 !HISTORY 2002-08-18 [PTadmin] Official Update 2002-04
// 0 !HISTORY 2004-07-27 [guyvivan] Made BFC Compliant
// 0 !HISTORY 2004-11-06 [PTadmin] Official Update 2004-04
// 0 !HISTORY 2007-07-18 [PTadmin] Header formatted for Contributor Agreement
// 0 !HISTORY 2008-07-01 [PTadmin] Official Update 2008-01
// 0 !HISTORY 2008-07-07 [johnny-thunder] subfiled (2006-07-01)
// 0 !HISTORY 2009-12-29 [PTadmin] Official Update 2009-03
// 
// 
// 1 16 0 0 0 1 0 0 0 1 0 0 0 1 s\6636s01.dat
  [1,16,0,0,0,1,0,0,0,1,0,0,0,1, ldraw_lib__s__6636s01()],
// 4 16 60 0 -10 60 0 10 -60 0 10 -60 0 -10
  [4,16,60,0,-10,60,0,10,-60,0,10,-60,0,-10],
// 0
];
makepoly(ldraw_lib__6636(), line=0.2);
// file: 6148328at.scad
use <../lib.scad>
use <../p/1-4chrd.scad>
use <../p/1-4cyli.scad>
function ldraw_lib__6148328at() = [
// 0 Sticker  0.8 x  5.8 with Dark Grey Lines on White Background
// 0 Name: 6148328at.dat
// 0 Author: Massimo Maso [Sirio]
// 0 !LDRAW_ORG Part UPDATE 2024-08
// 0 !LICENSE Licensed under CC BY 4.0 : see CAreadme.txt
// 
// 0 BFC CERTIFY CCW
  [0,"BFC","CERTIFY"],
  [0,"BFC","CCW"],
// 
// 0 !KEYWORDS 919, Bricklink 75876stk01, Brickowl 852010, Hybrid, Pit Lane
// 0 !KEYWORDS Porsche, Rebrickable 26357, set 75876, Speed Champions
// 
// 0 !HISTORY 2024-09-30 [OrionP] Official Update 2024-08
// 
// 
// 0 // Primitives
// 1 16 -56.5 0 6.5 -1.5 0 0 0 -1 0 0 0 1.5 1-4chrd.dat
  [1,16,-56.5,0,6.5,-1.5,0,0,0,-1,0,0,0,1.5, ldraw_lib__1_4chrd()],
// 1 16 56.5 0 6.5 1.5 0 0 0 -1 0 0 0 1.5 1-4chrd.dat
  [1,16,56.5,0,6.5,1.5,0,0,0,-1,0,0,0,1.5, ldraw_lib__1_4chrd()],
// 1 16 -56.5 0 -6.5 -1.5 0 0 0 -1 0 0 0 -1.5 1-4chrd.dat
  [1,16,-56.5,0,-6.5,-1.5,0,0,0,-1,0,0,0,-1.5, ldraw_lib__1_4chrd()],
// 1 16 56.5 0 -6.5 1.5 0 0 0 -1 0 0 0 -1.5 1-4chrd.dat
  [1,16,56.5,0,-6.5,1.5,0,0,0,-1,0,0,0,-1.5, ldraw_lib__1_4chrd()],
// 1 16 -56.5 0 6.5 -1.5 0 0 0 -.25 0 0 0 1.5 1-4cyli.dat
  [1,16,-56.5,0,6.5,-1.5,0,0,0,-.25,0,0,0,1.5, ldraw_lib__1_4cyli()],
// 1 16 56.5 0 6.5 1.5 0 0 0 -.25 0 0 0 1.5 1-4cyli.dat
  [1,16,56.5,0,6.5,1.5,0,0,0,-.25,0,0,0,1.5, ldraw_lib__1_4cyli()],
// 1 16 -56.5 0 -6.5 -1.5 0 0 0 -.25 0 0 0 -1.5 1-4cyli.dat
  [1,16,-56.5,0,-6.5,-1.5,0,0,0,-.25,0,0,0,-1.5, ldraw_lib__1_4cyli()],
// 1 16 56.5 0 -6.5 1.5 0 0 0 -.25 0 0 0 -1.5 1-4cyli.dat
  [1,16,56.5,0,-6.5,1.5,0,0,0,-.25,0,0,0,-1.5, ldraw_lib__1_4cyli()],
// 1 15 -56.5 -.25 6.5 -1.5 0 0 0 1 0 0 0 1.5 1-4chrd.dat
  [1,15,-56.5,-.25,6.5,-1.5,0,0,0,1,0,0,0,1.5, ldraw_lib__1_4chrd()],
// 1 15 56.5 -.25 6.5 1.5 0 0 0 1 0 0 0 1.5 1-4chrd.dat
  [1,15,56.5,-.25,6.5,1.5,0,0,0,1,0,0,0,1.5, ldraw_lib__1_4chrd()],
// 1 15 -56.5 -.25 -6.5 -1.5 0 0 0 1 0 0 0 -1.5 1-4chrd.dat
  [1,15,-56.5,-.25,-6.5,-1.5,0,0,0,1,0,0,0,-1.5, ldraw_lib__1_4chrd()],
// 1 15 56.5 -.25 -6.5 1.5 0 0 0 1 0 0 0 -1.5 1-4chrd.dat
  [1,15,56.5,-.25,-6.5,1.5,0,0,0,1,0,0,0,-1.5, ldraw_lib__1_4chrd()],
// 0 // Bottom faces
// 4 16 56.5 0 8 58 0 6.5 -58 0 6.5 -56.5 0 8
  [4,16,56.5,0,8,58,0,6.5,-58,0,6.5,-56.5,0,8],
// 4 16 58 0 6.5 58 0 -6.5 -58 0 -6.5 -58 0 6.5
  [4,16,58,0,6.5,58,0,-6.5,-58,0,-6.5,-58,0,6.5],
// 4 16 56.5 0 -8 -56.5 0 -8 -58 0 -6.5 58 0 -6.5
  [4,16,56.5,0,-8,-56.5,0,-8,-58,0,-6.5,58,0,-6.5],
// 0 // Lateral faces
// 3 16 -56.5 0 8 -56.5 -.25 8 -35 -.25 8
  [3,16,-56.5,0,8,-56.5,-.25,8,-35,-.25,8],
// 3 16 -56.5 0 8 -35 -.25 8 -29 -.25 8
  [3,16,-56.5,0,8,-35,-.25,8,-29,-.25,8],
// 4 16 -56.5 0 8 -29 -.25 8 25 -.25 8 56.5 0 8
  [4,16,-56.5,0,8,-29,-.25,8,25,-.25,8,56.5,0,8],
// 3 16 56.5 0 8 25 -.25 8 31 -.25 8
  [3,16,56.5,0,8,25,-.25,8,31,-.25,8],
// 3 16 56.5 0 8 31 -.25 8 56.5 -.25 8
  [3,16,56.5,0,8,31,-.25,8,56.5,-.25,8],
// 4 16 -58 0 6.5 -58 0 -6.5 -58 -.25 -6.5 -58 -.25 6.5
  [4,16,-58,0,6.5,-58,0,-6.5,-58,-.25,-6.5,-58,-.25,6.5],
// 3 16 58 0 6.5 58 -.25 6.5 58 -.25 3.6
  [3,16,58,0,6.5,58,-.25,6.5,58,-.25,3.6],
// 4 16 58 0 6.5 58 -.25 3.6 58 -.25 -3.6 58 0 -6.5
  [4,16,58,0,6.5,58,-.25,3.6,58,-.25,-3.6,58,0,-6.5],
// 3 16 58 0 -6.5 58 -.25 -3.6 58 -.25 -6.5
  [3,16,58,0,-6.5,58,-.25,-3.6,58,-.25,-6.5],
// 3 16 -56.5 0 -8 -35 -.25 -8 -56.5 -.25 -8
  [3,16,-56.5,0,-8,-35,-.25,-8,-56.5,-.25,-8],
// 3 16 -56.5 0 -8 -29 -.25 -8 -35 -.25 -8
  [3,16,-56.5,0,-8,-29,-.25,-8,-35,-.25,-8],
// 4 16 -56.5 0 -8 56.5 0 -8 25 -.25 -8 -29 -.25 -8
  [4,16,-56.5,0,-8,56.5,0,-8,25,-.25,-8,-29,-.25,-8],
// 3 16 56.5 0 -8 31 -.25 -8 25 -.25 -8
  [3,16,56.5,0,-8,31,-.25,-8,25,-.25,-8],
// 3 16 56.5 0 -8 56.5 -.25 -8 31 -.25 -8
  [3,16,56.5,0,-8,56.5,-.25,-8,31,-.25,-8],
// 0 // Top faces
// 0 // Dark grey faces
// 4 72 -29 -.25 8 -35 -.25 8 -35 -.25 -8 -29 -.25 -8
  [4,72,-29,-.25,8,-35,-.25,8,-35,-.25,-8,-29,-.25,-8],
// 4 72 31 -.25 8 25 -.25 8 25 -.25 -8 31 -.25 -8
  [4,72,31,-.25,8,25,-.25,8,25,-.25,-8,31,-.25,-8],
// 4 72 58 -.25 3.6 42 -.25 3.6 42 -.25 -3.6 58 -.25 -3.6
  [4,72,58,-.25,3.6,42,-.25,3.6,42,-.25,-3.6,58,-.25,-3.6],
// 0 // White faces
// 4 15 -56.5 -.25 8 -58 -.25 6.5 -58 -.25 -6.5 -56.5 -.25 -8
  [4,15,-56.5,-.25,8,-58,-.25,6.5,-58,-.25,-6.5,-56.5,-.25,-8],
// 4 15 -56.5 -.25 8 -56.5 -.25 -8 -35 -.25 -8 -35 -.25 8
  [4,15,-56.5,-.25,8,-56.5,-.25,-8,-35,-.25,-8,-35,-.25,8],
// 4 15 -29 -.25 8 -29 -.25 -8 25 -.25 -8 25 -.25 8
  [4,15,-29,-.25,8,-29,-.25,-8,25,-.25,-8,25,-.25,8],
// 4 15 31 -.25 8 31 -.25 -8 42 -.25 -3.6 42 -.25 3.6
  [4,15,31,-.25,8,31,-.25,-8,42,-.25,-3.6,42,-.25,3.6],
// 4 15 31 -.25 8 42 -.25 3.6 58 -.25 3.6 58 -.25 6.5
  [4,15,31,-.25,8,42,-.25,3.6,58,-.25,3.6,58,-.25,6.5],
// 3 15 31 -.25 8 58 -.25 6.5 56.5 -.25 8
  [3,15,31,-.25,8,58,-.25,6.5,56.5,-.25,8],
// 4 15 31 -.25 -8 58 -.25 -6.5 58 -.25 -3.6 42 -.25 -3.6
  [4,15,31,-.25,-8,58,-.25,-6.5,58,-.25,-3.6,42,-.25,-3.6],
// 3 15 31 -.25 -8 56.5 -.25 -8 58 -.25 -6.5
  [3,15,31,-.25,-8,56.5,-.25,-8,58,-.25,-6.5],
];
module ldraw_lib__6148328at(step=0, col=false, unit=2/5, alt=false, line=0.2, solid=!$preview)
    makepoly(ldraw_lib__6148328at(), step=step, col=col, unit=unit, alt=alt, line=line, solid=solid);
ldraw_lib__6148328at(line=0.2);
// main file
use <../lib.scad>
use <6148328at.scad>
use <6636.scad>
function ldraw_lib__6636d0e() = [
// 0 Tile  1 x  6 with Dark Grey Lines on White Background Sticker
// 0 Name: 6636d0e.dat
// 0 Author: Vincent Messenet [Cheenzo]
// 0 !LDRAW_ORG Shortcut UPDATE 2026-05
// 0 !LICENSE Licensed under CC BY 4.0 : see CAreadme.txt
// 
// 0 BFC CERTIFY CCW
  [0,"BFC","CERTIFY"],
  [0,"BFC","CCW"],
// 
// 0 !CATEGORY Sticker Shortcut
// 
// 0 !KEYWORDS Bricklink 6636pb173, Porsche 919 Hybrid and 917K Pit Lane, set 75876
// 0 !KEYWORDS Speed Champions
// 
// 0 !HISTORY 2026-05-31 [OrionP] Official Update 2026-05
// 
// 1 16 0 0 0 1 0 0 0 1 0 0 0 1 6636.dat
  [1,16,0,0,0,1,0,0,0,1,0,0,0,1, ldraw_lib__6636()],
// 1 16 0 0 0 1 0 0 0 1 0 0 0 1 6148328at.dat
  [1,16,0,0,0,1,0,0,0,1,0,0,0,1, ldraw_lib__6148328at()],
];
module ldraw_lib__6636d0e(step=0, col=false, unit=2/5, alt=false, line=0.2, solid=!$preview)
    makepoly(ldraw_lib__6636d0e(), step=step, col=col, unit=unit, alt=alt, line=line, solid=solid);
ldraw_lib__6636d0e(line=0.2);
